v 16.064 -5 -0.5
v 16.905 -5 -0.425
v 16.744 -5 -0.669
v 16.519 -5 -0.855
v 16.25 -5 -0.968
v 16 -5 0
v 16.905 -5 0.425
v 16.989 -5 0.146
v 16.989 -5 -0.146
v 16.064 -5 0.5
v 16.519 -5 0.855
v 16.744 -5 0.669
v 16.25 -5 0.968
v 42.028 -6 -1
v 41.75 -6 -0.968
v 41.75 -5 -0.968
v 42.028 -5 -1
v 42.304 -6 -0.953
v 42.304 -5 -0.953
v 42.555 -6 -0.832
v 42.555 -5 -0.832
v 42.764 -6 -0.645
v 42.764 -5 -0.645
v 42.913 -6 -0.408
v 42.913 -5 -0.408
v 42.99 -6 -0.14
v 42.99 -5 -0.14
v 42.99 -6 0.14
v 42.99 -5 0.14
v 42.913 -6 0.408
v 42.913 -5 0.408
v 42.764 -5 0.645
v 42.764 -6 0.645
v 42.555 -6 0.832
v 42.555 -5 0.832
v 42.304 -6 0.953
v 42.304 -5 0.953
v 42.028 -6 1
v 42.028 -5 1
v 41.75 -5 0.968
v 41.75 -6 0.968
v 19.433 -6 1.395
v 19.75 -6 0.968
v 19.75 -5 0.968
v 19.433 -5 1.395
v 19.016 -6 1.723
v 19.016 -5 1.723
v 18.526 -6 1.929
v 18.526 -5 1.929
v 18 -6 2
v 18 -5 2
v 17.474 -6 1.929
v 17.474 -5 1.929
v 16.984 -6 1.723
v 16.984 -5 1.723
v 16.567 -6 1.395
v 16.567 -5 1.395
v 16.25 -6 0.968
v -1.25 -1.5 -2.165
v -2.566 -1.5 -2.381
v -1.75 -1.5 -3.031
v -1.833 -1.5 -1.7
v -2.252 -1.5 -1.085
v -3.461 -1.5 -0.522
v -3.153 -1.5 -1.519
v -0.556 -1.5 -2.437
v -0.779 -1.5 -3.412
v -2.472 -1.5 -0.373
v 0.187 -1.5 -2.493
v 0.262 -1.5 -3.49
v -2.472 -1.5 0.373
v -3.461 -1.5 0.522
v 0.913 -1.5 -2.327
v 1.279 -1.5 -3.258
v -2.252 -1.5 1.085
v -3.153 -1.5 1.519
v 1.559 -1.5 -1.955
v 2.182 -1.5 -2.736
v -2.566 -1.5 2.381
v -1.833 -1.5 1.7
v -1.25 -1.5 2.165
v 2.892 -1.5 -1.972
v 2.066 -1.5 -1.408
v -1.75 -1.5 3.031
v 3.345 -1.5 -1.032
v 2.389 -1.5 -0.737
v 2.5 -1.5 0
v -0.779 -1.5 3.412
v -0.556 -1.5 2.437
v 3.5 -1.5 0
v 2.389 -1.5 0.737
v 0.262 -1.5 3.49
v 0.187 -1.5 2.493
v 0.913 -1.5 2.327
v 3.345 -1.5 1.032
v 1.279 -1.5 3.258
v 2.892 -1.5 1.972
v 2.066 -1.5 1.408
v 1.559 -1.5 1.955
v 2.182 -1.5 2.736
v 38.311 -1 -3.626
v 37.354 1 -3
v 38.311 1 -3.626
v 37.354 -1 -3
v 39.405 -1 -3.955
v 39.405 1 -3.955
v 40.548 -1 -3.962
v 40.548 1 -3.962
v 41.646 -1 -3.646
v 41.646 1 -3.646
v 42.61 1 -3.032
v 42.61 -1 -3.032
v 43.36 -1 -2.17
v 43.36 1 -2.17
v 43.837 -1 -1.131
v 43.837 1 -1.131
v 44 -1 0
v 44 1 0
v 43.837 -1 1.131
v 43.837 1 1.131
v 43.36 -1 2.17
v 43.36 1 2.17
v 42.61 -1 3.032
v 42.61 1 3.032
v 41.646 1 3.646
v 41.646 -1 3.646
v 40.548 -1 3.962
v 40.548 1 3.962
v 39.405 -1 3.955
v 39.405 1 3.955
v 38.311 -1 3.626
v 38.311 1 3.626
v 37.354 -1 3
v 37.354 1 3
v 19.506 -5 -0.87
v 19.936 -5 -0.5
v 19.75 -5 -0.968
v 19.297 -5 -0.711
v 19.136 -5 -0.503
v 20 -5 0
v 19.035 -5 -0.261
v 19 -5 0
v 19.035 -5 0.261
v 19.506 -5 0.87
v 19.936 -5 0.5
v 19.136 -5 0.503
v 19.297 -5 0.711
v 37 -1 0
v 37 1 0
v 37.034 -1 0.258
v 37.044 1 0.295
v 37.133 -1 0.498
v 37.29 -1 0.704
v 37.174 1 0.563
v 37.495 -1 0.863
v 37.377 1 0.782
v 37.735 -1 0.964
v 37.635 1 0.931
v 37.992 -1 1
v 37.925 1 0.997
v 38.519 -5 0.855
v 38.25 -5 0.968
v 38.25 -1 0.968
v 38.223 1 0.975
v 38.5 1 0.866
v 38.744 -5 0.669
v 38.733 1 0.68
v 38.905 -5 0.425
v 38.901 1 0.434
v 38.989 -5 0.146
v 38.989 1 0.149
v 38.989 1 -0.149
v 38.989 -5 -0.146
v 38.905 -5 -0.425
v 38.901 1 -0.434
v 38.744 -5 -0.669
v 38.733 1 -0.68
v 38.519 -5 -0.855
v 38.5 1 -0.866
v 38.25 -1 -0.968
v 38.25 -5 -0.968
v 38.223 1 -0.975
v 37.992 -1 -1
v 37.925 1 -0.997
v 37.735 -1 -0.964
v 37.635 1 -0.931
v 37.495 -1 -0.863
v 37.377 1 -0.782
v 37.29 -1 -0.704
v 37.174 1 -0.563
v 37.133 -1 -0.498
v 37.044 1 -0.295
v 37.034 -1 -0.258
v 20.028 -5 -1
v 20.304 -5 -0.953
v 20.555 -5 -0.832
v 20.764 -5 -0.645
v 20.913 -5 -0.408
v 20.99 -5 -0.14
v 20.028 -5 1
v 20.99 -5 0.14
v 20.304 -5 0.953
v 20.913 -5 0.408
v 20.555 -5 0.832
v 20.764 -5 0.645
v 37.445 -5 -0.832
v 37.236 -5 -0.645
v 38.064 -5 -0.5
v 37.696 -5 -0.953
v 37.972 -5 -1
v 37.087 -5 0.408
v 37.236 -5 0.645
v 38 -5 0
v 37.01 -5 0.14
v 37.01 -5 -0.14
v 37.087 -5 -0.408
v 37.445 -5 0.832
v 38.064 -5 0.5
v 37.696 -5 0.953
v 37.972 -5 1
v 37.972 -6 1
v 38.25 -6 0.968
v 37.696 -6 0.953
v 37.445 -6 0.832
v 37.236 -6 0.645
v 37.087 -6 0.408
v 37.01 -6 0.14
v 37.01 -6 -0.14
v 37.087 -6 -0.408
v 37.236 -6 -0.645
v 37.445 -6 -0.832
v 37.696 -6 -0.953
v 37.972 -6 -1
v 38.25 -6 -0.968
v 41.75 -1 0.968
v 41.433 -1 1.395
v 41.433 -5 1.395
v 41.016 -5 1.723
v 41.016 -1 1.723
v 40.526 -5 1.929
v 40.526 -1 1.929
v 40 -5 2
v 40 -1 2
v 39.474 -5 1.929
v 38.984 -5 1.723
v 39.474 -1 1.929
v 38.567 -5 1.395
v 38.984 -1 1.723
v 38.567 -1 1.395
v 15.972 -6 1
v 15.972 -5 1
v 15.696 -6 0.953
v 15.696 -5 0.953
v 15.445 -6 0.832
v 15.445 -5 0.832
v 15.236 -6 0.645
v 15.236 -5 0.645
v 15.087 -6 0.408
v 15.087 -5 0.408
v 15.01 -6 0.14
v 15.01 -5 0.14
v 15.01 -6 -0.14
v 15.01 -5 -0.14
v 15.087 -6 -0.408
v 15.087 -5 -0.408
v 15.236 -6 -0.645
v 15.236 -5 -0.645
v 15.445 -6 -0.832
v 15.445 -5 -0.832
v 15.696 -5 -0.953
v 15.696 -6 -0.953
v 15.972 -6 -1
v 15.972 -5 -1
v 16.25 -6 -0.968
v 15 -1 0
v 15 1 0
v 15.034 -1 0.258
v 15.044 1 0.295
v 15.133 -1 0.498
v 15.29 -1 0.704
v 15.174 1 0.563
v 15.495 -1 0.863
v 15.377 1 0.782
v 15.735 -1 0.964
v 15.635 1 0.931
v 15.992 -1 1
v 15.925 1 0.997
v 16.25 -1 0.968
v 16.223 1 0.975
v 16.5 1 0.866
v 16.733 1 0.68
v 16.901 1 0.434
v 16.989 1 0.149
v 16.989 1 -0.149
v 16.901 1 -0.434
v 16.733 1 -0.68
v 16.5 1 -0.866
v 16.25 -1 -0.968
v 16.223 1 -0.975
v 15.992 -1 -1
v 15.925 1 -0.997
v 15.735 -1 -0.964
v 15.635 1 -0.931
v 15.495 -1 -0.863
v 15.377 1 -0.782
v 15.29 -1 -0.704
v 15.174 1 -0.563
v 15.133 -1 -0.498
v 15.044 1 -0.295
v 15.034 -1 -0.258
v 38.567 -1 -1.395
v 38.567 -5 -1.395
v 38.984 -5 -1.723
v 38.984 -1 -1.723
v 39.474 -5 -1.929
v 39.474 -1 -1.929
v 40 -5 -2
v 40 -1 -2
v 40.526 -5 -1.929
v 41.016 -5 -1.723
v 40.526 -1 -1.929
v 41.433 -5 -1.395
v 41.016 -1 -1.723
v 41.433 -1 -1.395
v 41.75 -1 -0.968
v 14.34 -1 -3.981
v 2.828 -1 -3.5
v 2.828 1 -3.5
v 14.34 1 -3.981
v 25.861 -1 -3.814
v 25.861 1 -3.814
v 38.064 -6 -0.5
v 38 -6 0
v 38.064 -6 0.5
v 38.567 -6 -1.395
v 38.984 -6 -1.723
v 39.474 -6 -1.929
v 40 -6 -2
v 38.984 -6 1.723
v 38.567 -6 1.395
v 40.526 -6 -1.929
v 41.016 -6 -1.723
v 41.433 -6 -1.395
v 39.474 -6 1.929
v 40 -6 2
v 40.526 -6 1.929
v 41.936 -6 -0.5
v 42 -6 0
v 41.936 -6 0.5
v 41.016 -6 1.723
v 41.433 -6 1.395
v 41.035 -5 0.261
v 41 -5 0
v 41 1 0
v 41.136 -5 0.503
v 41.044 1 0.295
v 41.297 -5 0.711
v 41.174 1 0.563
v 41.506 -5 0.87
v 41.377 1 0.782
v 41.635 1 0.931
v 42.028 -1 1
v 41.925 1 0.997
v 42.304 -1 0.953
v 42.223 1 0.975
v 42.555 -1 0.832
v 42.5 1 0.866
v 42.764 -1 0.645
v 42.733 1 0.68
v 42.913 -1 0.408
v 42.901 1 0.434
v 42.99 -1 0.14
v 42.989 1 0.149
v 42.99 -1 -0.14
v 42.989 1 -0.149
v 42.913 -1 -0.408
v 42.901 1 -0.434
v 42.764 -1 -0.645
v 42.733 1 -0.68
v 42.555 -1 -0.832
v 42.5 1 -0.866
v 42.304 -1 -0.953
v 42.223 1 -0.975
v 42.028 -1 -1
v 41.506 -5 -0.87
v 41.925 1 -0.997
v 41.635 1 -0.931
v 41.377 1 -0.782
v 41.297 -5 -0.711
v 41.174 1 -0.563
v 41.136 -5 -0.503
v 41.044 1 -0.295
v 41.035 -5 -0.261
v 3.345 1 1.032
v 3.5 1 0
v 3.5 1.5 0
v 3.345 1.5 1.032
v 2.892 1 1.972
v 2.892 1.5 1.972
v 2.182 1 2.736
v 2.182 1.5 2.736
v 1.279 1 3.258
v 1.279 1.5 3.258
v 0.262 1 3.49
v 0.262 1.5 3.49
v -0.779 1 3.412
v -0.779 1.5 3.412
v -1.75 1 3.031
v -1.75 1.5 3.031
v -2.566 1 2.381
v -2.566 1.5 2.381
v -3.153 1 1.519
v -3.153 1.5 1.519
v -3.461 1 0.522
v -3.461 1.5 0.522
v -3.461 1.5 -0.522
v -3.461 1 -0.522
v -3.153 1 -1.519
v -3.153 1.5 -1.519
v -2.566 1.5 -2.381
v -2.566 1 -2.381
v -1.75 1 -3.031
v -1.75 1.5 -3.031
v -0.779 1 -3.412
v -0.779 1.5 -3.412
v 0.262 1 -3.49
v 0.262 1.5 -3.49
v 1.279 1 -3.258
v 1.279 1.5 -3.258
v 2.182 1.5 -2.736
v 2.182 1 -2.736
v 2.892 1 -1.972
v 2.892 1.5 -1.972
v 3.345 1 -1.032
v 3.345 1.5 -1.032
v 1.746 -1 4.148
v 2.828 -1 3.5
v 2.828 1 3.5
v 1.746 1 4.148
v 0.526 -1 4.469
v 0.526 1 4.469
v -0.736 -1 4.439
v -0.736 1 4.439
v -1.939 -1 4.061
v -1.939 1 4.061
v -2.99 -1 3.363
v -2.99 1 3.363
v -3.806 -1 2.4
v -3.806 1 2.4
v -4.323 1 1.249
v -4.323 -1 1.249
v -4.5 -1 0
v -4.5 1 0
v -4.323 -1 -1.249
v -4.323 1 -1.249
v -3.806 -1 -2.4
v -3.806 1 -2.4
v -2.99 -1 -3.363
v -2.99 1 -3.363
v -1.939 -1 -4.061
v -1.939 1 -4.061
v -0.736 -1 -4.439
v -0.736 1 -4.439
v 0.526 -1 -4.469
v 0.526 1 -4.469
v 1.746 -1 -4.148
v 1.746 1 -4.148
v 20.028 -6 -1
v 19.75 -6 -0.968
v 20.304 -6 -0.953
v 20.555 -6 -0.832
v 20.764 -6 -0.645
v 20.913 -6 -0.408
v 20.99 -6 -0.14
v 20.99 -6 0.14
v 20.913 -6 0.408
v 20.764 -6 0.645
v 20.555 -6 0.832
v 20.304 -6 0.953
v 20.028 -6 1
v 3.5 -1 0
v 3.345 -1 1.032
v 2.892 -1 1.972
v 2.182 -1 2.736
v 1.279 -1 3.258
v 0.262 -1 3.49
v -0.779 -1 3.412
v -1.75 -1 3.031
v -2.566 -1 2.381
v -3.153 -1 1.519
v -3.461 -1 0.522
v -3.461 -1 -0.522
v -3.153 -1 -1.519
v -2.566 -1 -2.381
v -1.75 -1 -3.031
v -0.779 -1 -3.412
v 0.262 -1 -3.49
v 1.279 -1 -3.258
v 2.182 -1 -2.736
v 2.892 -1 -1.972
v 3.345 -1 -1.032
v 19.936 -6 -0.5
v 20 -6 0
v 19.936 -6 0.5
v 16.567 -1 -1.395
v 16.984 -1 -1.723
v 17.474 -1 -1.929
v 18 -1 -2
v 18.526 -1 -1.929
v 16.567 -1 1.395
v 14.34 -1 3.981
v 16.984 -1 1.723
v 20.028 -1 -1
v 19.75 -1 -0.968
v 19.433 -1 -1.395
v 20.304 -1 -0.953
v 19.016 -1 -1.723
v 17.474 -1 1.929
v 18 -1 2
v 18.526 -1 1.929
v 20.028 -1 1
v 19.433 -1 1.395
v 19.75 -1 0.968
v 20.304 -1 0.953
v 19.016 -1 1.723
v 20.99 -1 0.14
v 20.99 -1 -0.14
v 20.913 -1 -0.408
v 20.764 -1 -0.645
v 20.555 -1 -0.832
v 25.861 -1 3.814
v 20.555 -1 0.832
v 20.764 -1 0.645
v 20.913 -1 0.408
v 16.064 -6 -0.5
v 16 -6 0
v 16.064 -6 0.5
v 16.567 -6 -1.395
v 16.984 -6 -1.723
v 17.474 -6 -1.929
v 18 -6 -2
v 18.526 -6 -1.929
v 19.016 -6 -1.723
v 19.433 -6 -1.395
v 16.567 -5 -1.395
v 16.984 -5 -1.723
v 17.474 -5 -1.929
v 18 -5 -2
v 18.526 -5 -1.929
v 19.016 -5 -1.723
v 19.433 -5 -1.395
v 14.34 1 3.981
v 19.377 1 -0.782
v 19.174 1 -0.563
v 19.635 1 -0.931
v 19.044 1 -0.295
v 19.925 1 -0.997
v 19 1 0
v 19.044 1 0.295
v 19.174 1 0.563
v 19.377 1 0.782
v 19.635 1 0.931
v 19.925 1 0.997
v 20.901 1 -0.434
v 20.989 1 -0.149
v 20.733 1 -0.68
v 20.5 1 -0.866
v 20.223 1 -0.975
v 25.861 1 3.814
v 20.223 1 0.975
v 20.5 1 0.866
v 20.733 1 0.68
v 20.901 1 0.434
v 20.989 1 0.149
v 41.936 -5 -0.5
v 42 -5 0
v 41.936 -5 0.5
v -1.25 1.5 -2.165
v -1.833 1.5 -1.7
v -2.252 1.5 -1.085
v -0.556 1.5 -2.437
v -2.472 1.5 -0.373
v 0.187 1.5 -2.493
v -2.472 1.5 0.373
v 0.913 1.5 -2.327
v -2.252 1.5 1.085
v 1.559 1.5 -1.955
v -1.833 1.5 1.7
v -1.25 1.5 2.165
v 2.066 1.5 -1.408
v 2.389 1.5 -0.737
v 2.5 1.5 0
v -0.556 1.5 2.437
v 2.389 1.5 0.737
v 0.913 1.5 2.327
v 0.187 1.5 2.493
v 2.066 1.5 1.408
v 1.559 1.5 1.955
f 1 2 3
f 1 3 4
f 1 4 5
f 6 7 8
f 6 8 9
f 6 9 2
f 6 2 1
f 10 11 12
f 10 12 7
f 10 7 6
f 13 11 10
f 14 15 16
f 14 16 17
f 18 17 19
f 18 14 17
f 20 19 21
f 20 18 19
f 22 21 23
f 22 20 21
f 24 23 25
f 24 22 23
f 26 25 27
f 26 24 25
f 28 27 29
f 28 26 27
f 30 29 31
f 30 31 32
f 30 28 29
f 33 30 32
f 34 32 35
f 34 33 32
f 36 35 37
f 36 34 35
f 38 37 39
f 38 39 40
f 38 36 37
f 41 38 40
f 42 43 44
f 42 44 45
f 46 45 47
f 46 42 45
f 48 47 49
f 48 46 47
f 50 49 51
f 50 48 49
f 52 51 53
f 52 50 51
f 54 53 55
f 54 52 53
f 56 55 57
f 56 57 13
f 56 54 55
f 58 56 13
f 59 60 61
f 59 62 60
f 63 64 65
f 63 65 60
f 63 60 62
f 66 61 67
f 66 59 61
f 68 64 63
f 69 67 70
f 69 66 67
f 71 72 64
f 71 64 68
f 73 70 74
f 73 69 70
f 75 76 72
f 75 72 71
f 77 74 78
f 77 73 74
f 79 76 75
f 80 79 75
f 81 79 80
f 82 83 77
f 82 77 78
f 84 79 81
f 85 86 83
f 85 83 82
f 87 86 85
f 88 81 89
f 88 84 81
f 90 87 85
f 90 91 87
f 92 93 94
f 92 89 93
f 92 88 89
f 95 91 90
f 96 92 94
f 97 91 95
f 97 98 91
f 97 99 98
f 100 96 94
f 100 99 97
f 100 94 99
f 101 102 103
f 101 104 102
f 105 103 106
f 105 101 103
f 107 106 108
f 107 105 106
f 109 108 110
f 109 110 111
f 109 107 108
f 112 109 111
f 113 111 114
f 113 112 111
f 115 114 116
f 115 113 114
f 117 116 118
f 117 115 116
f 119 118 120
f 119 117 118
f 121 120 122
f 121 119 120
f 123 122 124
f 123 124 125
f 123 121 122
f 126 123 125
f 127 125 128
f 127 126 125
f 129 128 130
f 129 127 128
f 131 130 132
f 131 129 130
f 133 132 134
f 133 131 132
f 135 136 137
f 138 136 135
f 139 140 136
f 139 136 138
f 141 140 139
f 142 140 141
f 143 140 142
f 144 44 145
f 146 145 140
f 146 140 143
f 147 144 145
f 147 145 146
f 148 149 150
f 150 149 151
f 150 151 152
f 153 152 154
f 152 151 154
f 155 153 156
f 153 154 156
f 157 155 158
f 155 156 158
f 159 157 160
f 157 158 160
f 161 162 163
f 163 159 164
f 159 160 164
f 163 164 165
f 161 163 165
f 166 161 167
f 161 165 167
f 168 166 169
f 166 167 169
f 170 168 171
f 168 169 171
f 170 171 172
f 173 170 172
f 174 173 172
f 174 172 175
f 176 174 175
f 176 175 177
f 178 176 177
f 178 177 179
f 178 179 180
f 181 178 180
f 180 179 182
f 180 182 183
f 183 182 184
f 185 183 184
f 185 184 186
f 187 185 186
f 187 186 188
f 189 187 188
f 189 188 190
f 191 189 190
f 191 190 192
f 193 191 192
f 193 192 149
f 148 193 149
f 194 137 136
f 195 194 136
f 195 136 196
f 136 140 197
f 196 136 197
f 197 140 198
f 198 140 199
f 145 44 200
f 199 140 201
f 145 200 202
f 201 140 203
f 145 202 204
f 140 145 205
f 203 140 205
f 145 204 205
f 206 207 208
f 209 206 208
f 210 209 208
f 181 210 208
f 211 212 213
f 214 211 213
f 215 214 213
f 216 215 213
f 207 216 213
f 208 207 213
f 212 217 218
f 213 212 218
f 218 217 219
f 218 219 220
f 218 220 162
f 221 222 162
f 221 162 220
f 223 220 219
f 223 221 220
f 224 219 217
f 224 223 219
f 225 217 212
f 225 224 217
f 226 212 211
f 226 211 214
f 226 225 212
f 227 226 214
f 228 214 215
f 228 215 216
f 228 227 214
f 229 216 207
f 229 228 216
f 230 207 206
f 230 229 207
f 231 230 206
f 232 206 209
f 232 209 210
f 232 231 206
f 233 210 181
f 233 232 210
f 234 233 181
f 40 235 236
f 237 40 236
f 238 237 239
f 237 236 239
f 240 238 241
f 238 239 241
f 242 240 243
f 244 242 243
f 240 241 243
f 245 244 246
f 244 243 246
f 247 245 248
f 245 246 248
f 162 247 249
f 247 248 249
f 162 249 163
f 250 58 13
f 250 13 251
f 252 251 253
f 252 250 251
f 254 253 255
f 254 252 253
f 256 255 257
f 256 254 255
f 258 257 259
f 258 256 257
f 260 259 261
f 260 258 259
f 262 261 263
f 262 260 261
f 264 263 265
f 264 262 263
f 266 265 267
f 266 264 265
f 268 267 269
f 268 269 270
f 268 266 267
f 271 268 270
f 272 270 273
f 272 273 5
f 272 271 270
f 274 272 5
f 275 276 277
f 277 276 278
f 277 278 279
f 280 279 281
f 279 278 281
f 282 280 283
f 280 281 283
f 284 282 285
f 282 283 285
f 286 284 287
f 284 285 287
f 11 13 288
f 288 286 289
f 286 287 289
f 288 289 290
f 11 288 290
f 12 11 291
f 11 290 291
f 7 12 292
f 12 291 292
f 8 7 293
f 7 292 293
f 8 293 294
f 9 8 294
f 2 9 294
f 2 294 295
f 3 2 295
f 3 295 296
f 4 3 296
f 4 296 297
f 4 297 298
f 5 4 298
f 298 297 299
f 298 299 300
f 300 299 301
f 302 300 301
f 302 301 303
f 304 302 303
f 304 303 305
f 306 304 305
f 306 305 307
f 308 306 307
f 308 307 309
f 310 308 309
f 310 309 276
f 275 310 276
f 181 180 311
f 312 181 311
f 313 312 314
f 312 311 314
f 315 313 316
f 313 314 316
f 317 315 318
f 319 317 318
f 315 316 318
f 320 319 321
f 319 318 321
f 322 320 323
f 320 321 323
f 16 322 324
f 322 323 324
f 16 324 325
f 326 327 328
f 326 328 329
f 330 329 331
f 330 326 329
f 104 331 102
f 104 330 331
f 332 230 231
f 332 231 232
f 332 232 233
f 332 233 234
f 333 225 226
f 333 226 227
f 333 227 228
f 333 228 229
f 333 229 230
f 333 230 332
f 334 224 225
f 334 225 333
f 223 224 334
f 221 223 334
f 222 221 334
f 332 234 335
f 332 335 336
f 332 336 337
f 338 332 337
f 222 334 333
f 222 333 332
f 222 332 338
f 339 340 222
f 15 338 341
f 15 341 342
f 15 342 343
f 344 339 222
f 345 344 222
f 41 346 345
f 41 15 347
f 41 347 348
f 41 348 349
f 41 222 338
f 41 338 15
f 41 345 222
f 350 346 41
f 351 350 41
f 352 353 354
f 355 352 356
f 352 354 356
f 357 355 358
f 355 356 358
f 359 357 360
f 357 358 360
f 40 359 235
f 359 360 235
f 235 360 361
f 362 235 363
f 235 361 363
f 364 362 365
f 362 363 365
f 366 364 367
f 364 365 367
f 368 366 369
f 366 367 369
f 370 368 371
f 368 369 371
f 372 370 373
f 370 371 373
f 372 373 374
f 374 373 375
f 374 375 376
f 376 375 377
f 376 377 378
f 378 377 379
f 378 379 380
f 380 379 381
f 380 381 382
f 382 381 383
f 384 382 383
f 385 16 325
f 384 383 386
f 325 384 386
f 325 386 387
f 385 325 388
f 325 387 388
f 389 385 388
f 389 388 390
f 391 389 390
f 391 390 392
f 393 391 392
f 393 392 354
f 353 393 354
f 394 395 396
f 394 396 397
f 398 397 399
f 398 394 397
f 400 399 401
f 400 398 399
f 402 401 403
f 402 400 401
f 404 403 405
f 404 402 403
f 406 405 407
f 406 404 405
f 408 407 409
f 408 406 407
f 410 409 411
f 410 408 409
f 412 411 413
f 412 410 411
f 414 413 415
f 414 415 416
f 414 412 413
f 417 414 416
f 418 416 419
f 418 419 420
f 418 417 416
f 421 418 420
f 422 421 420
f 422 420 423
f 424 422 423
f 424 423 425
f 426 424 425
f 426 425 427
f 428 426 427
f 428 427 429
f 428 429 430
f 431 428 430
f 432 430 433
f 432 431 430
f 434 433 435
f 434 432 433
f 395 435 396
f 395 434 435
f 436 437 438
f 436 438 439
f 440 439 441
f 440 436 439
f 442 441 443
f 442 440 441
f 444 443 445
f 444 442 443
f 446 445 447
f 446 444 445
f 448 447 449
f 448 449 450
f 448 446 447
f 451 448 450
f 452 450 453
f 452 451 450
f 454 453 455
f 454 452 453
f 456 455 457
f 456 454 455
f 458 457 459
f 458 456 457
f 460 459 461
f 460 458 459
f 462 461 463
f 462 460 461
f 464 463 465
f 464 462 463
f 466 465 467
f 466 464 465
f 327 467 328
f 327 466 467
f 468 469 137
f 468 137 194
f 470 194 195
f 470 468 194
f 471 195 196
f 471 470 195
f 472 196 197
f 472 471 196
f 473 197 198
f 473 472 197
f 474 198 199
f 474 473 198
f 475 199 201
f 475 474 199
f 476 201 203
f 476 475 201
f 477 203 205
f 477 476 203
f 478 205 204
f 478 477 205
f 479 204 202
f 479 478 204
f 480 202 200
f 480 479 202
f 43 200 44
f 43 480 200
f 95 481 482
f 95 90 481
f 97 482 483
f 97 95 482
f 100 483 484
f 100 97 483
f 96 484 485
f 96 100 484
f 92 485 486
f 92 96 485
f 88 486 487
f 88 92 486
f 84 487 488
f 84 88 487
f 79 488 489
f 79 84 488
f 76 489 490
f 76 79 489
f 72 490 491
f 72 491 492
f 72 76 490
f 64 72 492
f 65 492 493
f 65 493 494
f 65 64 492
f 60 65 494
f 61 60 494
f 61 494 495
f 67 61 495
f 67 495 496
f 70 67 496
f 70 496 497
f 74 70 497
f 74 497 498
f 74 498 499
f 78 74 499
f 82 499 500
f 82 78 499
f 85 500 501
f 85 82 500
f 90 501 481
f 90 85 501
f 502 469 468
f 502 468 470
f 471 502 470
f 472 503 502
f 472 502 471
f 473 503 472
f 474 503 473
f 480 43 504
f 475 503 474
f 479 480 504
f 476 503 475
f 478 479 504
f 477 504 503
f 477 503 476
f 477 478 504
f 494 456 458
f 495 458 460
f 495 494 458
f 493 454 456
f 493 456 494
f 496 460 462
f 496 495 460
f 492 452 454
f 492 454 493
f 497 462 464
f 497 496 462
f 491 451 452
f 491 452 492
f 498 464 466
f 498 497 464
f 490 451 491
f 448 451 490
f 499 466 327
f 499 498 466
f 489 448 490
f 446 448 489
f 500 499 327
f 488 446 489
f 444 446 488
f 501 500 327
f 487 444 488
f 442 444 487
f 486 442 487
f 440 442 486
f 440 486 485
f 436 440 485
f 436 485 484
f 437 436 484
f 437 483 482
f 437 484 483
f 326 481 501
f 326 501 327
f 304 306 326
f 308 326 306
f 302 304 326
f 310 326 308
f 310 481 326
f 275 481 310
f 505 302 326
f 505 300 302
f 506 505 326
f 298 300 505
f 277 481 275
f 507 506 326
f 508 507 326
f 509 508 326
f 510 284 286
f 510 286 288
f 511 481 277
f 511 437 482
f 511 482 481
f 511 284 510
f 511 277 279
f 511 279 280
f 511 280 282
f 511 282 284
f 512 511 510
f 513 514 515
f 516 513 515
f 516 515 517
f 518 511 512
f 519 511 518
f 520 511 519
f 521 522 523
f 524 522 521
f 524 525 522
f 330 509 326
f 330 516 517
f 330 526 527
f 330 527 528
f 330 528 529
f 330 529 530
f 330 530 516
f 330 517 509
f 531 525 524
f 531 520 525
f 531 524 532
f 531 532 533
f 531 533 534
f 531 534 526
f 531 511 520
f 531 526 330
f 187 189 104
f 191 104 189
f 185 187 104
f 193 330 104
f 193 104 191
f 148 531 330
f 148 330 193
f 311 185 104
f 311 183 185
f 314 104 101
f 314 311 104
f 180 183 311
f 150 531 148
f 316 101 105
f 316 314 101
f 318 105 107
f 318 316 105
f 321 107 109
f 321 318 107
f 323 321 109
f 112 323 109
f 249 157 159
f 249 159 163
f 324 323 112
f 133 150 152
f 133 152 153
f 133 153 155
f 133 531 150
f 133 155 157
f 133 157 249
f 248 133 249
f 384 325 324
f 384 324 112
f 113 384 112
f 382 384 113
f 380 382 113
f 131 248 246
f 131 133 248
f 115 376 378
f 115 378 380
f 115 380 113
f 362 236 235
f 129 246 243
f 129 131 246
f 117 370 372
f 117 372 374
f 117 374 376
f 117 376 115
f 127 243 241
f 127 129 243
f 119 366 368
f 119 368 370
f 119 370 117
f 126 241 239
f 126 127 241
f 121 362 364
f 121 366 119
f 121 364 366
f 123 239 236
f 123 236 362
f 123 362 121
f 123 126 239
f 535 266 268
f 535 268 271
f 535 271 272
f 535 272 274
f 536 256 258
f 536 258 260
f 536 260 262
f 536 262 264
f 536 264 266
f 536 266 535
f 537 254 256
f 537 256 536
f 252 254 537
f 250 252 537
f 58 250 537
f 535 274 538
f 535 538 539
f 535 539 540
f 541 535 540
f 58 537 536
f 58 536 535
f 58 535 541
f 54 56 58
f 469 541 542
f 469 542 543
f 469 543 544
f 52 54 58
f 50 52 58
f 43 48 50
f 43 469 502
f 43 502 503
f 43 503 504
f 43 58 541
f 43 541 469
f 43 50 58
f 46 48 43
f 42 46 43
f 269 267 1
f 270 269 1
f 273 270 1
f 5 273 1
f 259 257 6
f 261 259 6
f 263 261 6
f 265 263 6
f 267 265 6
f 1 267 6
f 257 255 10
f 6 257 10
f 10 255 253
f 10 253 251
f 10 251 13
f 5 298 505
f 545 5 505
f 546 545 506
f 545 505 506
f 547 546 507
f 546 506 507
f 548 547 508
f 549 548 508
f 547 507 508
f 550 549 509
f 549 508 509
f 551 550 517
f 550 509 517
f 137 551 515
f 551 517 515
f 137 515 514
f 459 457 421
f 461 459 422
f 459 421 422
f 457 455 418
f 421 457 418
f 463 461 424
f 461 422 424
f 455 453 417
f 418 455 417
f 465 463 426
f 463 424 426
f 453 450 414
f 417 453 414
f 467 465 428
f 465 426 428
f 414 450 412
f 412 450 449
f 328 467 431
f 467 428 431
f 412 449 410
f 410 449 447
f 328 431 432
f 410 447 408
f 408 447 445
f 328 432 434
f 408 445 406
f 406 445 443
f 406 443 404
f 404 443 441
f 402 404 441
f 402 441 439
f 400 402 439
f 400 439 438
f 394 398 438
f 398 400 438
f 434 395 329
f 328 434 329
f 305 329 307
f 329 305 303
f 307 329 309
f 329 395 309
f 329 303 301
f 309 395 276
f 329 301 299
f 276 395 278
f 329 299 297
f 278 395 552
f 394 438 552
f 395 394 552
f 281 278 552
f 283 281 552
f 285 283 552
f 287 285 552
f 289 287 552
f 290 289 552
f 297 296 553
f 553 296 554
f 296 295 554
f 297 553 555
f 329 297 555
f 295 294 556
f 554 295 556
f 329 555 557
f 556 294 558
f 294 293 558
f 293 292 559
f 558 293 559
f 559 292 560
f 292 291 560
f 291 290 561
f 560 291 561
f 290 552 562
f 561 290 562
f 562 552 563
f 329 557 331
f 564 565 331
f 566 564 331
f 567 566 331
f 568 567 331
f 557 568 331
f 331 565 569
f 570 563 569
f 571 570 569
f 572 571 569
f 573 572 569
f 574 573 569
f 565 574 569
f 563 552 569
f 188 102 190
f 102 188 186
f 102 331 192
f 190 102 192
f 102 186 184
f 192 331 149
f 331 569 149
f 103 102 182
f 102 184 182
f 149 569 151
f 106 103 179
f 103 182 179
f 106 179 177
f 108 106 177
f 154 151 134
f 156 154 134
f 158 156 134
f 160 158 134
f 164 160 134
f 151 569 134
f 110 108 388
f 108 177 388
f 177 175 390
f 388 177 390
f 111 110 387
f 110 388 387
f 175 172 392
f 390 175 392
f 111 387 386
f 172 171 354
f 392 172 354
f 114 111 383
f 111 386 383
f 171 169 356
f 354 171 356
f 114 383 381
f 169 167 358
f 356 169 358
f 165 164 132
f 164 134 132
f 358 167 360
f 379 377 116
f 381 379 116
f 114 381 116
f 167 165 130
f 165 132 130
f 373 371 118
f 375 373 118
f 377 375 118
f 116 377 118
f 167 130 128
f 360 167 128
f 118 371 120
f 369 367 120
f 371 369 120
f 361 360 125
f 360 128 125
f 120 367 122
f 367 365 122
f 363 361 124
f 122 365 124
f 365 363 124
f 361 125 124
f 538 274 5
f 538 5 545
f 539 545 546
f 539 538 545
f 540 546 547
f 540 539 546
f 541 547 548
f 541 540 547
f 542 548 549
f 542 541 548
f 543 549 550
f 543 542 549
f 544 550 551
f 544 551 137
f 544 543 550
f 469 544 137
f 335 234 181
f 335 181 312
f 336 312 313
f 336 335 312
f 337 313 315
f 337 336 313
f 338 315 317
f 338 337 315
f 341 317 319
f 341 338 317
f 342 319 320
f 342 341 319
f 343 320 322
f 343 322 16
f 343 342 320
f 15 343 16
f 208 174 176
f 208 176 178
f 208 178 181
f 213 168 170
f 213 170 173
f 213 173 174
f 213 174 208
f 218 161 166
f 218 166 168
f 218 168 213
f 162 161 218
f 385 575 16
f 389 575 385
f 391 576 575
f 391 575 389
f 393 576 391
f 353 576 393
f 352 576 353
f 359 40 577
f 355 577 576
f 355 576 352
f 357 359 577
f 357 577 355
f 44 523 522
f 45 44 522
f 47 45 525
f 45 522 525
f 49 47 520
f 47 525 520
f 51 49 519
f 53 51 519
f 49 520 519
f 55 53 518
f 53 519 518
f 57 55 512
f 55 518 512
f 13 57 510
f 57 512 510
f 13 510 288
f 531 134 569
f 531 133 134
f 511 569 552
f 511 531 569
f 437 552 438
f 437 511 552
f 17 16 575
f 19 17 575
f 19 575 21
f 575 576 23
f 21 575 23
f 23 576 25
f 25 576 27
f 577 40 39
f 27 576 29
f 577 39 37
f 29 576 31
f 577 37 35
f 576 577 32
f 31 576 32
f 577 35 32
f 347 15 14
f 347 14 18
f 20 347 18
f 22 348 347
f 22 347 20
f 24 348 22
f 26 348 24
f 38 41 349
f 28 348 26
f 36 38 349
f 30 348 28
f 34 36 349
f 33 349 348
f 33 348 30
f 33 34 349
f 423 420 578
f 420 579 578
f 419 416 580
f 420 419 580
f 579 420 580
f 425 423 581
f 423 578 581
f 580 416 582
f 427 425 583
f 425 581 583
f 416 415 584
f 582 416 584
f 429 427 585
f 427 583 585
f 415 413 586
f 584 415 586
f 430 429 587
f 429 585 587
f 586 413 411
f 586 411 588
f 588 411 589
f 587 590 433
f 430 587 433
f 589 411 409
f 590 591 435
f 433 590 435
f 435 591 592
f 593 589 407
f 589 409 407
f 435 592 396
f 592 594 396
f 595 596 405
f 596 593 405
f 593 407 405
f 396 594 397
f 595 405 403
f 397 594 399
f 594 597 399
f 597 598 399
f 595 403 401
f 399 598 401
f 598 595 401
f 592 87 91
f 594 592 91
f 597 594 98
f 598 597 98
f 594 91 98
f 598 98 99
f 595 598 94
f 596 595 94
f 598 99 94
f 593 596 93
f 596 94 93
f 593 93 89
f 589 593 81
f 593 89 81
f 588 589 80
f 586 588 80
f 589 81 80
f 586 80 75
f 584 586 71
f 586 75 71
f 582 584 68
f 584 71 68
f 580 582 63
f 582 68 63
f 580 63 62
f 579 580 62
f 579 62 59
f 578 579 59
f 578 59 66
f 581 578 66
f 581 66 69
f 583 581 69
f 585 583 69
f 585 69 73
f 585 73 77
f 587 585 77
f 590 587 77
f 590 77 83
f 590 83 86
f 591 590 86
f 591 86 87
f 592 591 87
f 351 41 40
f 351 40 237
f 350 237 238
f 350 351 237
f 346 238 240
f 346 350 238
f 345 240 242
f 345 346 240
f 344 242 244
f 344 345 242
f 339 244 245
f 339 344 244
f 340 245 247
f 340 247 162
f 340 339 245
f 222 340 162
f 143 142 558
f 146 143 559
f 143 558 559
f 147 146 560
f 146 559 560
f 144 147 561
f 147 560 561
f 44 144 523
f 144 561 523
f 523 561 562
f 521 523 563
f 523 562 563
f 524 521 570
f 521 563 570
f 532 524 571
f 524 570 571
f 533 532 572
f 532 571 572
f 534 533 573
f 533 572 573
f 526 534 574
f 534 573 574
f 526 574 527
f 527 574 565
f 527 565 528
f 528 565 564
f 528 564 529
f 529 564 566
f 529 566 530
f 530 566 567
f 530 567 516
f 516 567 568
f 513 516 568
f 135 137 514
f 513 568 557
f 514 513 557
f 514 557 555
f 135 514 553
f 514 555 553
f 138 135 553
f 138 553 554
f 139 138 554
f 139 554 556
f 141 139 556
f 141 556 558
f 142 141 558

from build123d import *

# Parameters (mm, degrees)
F1_DEPTH  = 1
F2_R      = 3.5
F3_DEPTH  = 1.5
F4_R      = 2.5
F5_DEPTH  = 3.001
F6_R      = 2
F7_DEPTH  = 5
F9_DEPTH  = 1
F10_R     = 1
F11_DEPTH = 6


with BuildPart() as f1:
    # F0 (on Front) → F1 (new body, symmetric)
    with BuildSketch(Plane.XZ):
        with BuildLine():
            ThreePointArc((37.3542486889, 3), (20.1018882017, 3.9785151955), (2.8284271247, 3.5))
            ThreePointArc((2.8284271247, 3.5), (-4.5, 0), (2.8284271247, -3.5))
            ThreePointArc((2.8284271247, -3.5), (20.1018882017, -3.9785151955), (37.3542486889, -3))
            ThreePointArc((37.3542486889, -3), (44, 0), (37.3542486889, 3))
        make_face()
    extrude(amount=F1_DEPTH, both=True)

    # F2 (on Front) → F3 (join, symmetric)
    with BuildSketch(Plane.XZ):
        Circle(F2_R)
    extrude(amount=F3_DEPTH, both=True)

    # F4 (on face) → F5 (cut, through all)
    with BuildSketch(Plane.XZ.offset(1.5)):
        Circle(F4_R)
    extrude(amount=-F5_DEPTH, mode=Mode.SUBTRACT)

    # F6 (on face) → F7 (join)
    with BuildSketch(Plane.XZ.offset(1)):
        with Locations((18, 0)):
            Circle(F6_R)
        with Locations((40, 0)):
            Circle(F6_R)
    extrude(amount=F7_DEPTH)

    # F8 (on face) → F9 (join)
    with BuildSketch(Plane.XZ.offset(6)):
        with BuildLine():
            ThreePointArc((16.25, -0.9682458366), (16, 0), (16.25, 0.9682458366))
            ThreePointArc((16.25, 0.9682458366), (15, 0), (16.25, -0.9682458366))
        make_face()
        with BuildLine():
            ThreePointArc((19.75, -0.9682458366), (21, 0), (19.75, 0.9682458366))
            ThreePointArc((19.75, 0.9682458366), (19.9364916731, 0.5), (20, 0))
            ThreePointArc((20, 0), (19.9364916731, -0.5), (19.75, -0.9682458366))
        make_face()
        with BuildLine():
            ThreePointArc((41.75, -0.9682458366), (43, 0), (41.75, 0.9682458366))
            ThreePointArc((41.75, 0.9682458366), (40, 2), (38.25, 0.9682458366))
            ThreePointArc((38.25, 0.9682458366), (37, 0), (38.25, -0.9682458366))
            ThreePointArc((38.25, -0.9682458366), (40, -2), (41.75, -0.9682458366))
        make_face()
        with BuildLine():
            ThreePointArc((20, 0), (19.9364916731, 0.5), (19.75, 0.9682458366))
            ThreePointArc((19.75, 0.9682458366), (18, 2), (16.25, 0.9682458366))
            ThreePointArc((16.25, 0.9682458366), (16, 0), (16.25, -0.9682458366))
            ThreePointArc((16.25, -0.9682458366), (18, -2), (19.75, -0.9682458366))
            ThreePointArc((19.75, -0.9682458366), (19.9364916731, -0.5), (20, 0))
        make_face()
    extrude(amount=-F9_DEPTH)

    # F10 (on face) → F11 (cut, through all)
    with BuildSketch(Plane(origin=(0, 1, 0), x_dir=(-1, 0, 0), z_dir=(0, 1, 0))):
        with Locations((-42, 0)):
            Circle(F10_R)
        with Locations((-38, 0)):
            Circle(F10_R)
        with Locations((-20, 0)):
            Circle(F10_R)
        with Locations((-16, 0)):
            Circle(F10_R)
    extrude(amount=-F11_DEPTH, mode=Mode.SUBTRACT)


solid = f1.part
